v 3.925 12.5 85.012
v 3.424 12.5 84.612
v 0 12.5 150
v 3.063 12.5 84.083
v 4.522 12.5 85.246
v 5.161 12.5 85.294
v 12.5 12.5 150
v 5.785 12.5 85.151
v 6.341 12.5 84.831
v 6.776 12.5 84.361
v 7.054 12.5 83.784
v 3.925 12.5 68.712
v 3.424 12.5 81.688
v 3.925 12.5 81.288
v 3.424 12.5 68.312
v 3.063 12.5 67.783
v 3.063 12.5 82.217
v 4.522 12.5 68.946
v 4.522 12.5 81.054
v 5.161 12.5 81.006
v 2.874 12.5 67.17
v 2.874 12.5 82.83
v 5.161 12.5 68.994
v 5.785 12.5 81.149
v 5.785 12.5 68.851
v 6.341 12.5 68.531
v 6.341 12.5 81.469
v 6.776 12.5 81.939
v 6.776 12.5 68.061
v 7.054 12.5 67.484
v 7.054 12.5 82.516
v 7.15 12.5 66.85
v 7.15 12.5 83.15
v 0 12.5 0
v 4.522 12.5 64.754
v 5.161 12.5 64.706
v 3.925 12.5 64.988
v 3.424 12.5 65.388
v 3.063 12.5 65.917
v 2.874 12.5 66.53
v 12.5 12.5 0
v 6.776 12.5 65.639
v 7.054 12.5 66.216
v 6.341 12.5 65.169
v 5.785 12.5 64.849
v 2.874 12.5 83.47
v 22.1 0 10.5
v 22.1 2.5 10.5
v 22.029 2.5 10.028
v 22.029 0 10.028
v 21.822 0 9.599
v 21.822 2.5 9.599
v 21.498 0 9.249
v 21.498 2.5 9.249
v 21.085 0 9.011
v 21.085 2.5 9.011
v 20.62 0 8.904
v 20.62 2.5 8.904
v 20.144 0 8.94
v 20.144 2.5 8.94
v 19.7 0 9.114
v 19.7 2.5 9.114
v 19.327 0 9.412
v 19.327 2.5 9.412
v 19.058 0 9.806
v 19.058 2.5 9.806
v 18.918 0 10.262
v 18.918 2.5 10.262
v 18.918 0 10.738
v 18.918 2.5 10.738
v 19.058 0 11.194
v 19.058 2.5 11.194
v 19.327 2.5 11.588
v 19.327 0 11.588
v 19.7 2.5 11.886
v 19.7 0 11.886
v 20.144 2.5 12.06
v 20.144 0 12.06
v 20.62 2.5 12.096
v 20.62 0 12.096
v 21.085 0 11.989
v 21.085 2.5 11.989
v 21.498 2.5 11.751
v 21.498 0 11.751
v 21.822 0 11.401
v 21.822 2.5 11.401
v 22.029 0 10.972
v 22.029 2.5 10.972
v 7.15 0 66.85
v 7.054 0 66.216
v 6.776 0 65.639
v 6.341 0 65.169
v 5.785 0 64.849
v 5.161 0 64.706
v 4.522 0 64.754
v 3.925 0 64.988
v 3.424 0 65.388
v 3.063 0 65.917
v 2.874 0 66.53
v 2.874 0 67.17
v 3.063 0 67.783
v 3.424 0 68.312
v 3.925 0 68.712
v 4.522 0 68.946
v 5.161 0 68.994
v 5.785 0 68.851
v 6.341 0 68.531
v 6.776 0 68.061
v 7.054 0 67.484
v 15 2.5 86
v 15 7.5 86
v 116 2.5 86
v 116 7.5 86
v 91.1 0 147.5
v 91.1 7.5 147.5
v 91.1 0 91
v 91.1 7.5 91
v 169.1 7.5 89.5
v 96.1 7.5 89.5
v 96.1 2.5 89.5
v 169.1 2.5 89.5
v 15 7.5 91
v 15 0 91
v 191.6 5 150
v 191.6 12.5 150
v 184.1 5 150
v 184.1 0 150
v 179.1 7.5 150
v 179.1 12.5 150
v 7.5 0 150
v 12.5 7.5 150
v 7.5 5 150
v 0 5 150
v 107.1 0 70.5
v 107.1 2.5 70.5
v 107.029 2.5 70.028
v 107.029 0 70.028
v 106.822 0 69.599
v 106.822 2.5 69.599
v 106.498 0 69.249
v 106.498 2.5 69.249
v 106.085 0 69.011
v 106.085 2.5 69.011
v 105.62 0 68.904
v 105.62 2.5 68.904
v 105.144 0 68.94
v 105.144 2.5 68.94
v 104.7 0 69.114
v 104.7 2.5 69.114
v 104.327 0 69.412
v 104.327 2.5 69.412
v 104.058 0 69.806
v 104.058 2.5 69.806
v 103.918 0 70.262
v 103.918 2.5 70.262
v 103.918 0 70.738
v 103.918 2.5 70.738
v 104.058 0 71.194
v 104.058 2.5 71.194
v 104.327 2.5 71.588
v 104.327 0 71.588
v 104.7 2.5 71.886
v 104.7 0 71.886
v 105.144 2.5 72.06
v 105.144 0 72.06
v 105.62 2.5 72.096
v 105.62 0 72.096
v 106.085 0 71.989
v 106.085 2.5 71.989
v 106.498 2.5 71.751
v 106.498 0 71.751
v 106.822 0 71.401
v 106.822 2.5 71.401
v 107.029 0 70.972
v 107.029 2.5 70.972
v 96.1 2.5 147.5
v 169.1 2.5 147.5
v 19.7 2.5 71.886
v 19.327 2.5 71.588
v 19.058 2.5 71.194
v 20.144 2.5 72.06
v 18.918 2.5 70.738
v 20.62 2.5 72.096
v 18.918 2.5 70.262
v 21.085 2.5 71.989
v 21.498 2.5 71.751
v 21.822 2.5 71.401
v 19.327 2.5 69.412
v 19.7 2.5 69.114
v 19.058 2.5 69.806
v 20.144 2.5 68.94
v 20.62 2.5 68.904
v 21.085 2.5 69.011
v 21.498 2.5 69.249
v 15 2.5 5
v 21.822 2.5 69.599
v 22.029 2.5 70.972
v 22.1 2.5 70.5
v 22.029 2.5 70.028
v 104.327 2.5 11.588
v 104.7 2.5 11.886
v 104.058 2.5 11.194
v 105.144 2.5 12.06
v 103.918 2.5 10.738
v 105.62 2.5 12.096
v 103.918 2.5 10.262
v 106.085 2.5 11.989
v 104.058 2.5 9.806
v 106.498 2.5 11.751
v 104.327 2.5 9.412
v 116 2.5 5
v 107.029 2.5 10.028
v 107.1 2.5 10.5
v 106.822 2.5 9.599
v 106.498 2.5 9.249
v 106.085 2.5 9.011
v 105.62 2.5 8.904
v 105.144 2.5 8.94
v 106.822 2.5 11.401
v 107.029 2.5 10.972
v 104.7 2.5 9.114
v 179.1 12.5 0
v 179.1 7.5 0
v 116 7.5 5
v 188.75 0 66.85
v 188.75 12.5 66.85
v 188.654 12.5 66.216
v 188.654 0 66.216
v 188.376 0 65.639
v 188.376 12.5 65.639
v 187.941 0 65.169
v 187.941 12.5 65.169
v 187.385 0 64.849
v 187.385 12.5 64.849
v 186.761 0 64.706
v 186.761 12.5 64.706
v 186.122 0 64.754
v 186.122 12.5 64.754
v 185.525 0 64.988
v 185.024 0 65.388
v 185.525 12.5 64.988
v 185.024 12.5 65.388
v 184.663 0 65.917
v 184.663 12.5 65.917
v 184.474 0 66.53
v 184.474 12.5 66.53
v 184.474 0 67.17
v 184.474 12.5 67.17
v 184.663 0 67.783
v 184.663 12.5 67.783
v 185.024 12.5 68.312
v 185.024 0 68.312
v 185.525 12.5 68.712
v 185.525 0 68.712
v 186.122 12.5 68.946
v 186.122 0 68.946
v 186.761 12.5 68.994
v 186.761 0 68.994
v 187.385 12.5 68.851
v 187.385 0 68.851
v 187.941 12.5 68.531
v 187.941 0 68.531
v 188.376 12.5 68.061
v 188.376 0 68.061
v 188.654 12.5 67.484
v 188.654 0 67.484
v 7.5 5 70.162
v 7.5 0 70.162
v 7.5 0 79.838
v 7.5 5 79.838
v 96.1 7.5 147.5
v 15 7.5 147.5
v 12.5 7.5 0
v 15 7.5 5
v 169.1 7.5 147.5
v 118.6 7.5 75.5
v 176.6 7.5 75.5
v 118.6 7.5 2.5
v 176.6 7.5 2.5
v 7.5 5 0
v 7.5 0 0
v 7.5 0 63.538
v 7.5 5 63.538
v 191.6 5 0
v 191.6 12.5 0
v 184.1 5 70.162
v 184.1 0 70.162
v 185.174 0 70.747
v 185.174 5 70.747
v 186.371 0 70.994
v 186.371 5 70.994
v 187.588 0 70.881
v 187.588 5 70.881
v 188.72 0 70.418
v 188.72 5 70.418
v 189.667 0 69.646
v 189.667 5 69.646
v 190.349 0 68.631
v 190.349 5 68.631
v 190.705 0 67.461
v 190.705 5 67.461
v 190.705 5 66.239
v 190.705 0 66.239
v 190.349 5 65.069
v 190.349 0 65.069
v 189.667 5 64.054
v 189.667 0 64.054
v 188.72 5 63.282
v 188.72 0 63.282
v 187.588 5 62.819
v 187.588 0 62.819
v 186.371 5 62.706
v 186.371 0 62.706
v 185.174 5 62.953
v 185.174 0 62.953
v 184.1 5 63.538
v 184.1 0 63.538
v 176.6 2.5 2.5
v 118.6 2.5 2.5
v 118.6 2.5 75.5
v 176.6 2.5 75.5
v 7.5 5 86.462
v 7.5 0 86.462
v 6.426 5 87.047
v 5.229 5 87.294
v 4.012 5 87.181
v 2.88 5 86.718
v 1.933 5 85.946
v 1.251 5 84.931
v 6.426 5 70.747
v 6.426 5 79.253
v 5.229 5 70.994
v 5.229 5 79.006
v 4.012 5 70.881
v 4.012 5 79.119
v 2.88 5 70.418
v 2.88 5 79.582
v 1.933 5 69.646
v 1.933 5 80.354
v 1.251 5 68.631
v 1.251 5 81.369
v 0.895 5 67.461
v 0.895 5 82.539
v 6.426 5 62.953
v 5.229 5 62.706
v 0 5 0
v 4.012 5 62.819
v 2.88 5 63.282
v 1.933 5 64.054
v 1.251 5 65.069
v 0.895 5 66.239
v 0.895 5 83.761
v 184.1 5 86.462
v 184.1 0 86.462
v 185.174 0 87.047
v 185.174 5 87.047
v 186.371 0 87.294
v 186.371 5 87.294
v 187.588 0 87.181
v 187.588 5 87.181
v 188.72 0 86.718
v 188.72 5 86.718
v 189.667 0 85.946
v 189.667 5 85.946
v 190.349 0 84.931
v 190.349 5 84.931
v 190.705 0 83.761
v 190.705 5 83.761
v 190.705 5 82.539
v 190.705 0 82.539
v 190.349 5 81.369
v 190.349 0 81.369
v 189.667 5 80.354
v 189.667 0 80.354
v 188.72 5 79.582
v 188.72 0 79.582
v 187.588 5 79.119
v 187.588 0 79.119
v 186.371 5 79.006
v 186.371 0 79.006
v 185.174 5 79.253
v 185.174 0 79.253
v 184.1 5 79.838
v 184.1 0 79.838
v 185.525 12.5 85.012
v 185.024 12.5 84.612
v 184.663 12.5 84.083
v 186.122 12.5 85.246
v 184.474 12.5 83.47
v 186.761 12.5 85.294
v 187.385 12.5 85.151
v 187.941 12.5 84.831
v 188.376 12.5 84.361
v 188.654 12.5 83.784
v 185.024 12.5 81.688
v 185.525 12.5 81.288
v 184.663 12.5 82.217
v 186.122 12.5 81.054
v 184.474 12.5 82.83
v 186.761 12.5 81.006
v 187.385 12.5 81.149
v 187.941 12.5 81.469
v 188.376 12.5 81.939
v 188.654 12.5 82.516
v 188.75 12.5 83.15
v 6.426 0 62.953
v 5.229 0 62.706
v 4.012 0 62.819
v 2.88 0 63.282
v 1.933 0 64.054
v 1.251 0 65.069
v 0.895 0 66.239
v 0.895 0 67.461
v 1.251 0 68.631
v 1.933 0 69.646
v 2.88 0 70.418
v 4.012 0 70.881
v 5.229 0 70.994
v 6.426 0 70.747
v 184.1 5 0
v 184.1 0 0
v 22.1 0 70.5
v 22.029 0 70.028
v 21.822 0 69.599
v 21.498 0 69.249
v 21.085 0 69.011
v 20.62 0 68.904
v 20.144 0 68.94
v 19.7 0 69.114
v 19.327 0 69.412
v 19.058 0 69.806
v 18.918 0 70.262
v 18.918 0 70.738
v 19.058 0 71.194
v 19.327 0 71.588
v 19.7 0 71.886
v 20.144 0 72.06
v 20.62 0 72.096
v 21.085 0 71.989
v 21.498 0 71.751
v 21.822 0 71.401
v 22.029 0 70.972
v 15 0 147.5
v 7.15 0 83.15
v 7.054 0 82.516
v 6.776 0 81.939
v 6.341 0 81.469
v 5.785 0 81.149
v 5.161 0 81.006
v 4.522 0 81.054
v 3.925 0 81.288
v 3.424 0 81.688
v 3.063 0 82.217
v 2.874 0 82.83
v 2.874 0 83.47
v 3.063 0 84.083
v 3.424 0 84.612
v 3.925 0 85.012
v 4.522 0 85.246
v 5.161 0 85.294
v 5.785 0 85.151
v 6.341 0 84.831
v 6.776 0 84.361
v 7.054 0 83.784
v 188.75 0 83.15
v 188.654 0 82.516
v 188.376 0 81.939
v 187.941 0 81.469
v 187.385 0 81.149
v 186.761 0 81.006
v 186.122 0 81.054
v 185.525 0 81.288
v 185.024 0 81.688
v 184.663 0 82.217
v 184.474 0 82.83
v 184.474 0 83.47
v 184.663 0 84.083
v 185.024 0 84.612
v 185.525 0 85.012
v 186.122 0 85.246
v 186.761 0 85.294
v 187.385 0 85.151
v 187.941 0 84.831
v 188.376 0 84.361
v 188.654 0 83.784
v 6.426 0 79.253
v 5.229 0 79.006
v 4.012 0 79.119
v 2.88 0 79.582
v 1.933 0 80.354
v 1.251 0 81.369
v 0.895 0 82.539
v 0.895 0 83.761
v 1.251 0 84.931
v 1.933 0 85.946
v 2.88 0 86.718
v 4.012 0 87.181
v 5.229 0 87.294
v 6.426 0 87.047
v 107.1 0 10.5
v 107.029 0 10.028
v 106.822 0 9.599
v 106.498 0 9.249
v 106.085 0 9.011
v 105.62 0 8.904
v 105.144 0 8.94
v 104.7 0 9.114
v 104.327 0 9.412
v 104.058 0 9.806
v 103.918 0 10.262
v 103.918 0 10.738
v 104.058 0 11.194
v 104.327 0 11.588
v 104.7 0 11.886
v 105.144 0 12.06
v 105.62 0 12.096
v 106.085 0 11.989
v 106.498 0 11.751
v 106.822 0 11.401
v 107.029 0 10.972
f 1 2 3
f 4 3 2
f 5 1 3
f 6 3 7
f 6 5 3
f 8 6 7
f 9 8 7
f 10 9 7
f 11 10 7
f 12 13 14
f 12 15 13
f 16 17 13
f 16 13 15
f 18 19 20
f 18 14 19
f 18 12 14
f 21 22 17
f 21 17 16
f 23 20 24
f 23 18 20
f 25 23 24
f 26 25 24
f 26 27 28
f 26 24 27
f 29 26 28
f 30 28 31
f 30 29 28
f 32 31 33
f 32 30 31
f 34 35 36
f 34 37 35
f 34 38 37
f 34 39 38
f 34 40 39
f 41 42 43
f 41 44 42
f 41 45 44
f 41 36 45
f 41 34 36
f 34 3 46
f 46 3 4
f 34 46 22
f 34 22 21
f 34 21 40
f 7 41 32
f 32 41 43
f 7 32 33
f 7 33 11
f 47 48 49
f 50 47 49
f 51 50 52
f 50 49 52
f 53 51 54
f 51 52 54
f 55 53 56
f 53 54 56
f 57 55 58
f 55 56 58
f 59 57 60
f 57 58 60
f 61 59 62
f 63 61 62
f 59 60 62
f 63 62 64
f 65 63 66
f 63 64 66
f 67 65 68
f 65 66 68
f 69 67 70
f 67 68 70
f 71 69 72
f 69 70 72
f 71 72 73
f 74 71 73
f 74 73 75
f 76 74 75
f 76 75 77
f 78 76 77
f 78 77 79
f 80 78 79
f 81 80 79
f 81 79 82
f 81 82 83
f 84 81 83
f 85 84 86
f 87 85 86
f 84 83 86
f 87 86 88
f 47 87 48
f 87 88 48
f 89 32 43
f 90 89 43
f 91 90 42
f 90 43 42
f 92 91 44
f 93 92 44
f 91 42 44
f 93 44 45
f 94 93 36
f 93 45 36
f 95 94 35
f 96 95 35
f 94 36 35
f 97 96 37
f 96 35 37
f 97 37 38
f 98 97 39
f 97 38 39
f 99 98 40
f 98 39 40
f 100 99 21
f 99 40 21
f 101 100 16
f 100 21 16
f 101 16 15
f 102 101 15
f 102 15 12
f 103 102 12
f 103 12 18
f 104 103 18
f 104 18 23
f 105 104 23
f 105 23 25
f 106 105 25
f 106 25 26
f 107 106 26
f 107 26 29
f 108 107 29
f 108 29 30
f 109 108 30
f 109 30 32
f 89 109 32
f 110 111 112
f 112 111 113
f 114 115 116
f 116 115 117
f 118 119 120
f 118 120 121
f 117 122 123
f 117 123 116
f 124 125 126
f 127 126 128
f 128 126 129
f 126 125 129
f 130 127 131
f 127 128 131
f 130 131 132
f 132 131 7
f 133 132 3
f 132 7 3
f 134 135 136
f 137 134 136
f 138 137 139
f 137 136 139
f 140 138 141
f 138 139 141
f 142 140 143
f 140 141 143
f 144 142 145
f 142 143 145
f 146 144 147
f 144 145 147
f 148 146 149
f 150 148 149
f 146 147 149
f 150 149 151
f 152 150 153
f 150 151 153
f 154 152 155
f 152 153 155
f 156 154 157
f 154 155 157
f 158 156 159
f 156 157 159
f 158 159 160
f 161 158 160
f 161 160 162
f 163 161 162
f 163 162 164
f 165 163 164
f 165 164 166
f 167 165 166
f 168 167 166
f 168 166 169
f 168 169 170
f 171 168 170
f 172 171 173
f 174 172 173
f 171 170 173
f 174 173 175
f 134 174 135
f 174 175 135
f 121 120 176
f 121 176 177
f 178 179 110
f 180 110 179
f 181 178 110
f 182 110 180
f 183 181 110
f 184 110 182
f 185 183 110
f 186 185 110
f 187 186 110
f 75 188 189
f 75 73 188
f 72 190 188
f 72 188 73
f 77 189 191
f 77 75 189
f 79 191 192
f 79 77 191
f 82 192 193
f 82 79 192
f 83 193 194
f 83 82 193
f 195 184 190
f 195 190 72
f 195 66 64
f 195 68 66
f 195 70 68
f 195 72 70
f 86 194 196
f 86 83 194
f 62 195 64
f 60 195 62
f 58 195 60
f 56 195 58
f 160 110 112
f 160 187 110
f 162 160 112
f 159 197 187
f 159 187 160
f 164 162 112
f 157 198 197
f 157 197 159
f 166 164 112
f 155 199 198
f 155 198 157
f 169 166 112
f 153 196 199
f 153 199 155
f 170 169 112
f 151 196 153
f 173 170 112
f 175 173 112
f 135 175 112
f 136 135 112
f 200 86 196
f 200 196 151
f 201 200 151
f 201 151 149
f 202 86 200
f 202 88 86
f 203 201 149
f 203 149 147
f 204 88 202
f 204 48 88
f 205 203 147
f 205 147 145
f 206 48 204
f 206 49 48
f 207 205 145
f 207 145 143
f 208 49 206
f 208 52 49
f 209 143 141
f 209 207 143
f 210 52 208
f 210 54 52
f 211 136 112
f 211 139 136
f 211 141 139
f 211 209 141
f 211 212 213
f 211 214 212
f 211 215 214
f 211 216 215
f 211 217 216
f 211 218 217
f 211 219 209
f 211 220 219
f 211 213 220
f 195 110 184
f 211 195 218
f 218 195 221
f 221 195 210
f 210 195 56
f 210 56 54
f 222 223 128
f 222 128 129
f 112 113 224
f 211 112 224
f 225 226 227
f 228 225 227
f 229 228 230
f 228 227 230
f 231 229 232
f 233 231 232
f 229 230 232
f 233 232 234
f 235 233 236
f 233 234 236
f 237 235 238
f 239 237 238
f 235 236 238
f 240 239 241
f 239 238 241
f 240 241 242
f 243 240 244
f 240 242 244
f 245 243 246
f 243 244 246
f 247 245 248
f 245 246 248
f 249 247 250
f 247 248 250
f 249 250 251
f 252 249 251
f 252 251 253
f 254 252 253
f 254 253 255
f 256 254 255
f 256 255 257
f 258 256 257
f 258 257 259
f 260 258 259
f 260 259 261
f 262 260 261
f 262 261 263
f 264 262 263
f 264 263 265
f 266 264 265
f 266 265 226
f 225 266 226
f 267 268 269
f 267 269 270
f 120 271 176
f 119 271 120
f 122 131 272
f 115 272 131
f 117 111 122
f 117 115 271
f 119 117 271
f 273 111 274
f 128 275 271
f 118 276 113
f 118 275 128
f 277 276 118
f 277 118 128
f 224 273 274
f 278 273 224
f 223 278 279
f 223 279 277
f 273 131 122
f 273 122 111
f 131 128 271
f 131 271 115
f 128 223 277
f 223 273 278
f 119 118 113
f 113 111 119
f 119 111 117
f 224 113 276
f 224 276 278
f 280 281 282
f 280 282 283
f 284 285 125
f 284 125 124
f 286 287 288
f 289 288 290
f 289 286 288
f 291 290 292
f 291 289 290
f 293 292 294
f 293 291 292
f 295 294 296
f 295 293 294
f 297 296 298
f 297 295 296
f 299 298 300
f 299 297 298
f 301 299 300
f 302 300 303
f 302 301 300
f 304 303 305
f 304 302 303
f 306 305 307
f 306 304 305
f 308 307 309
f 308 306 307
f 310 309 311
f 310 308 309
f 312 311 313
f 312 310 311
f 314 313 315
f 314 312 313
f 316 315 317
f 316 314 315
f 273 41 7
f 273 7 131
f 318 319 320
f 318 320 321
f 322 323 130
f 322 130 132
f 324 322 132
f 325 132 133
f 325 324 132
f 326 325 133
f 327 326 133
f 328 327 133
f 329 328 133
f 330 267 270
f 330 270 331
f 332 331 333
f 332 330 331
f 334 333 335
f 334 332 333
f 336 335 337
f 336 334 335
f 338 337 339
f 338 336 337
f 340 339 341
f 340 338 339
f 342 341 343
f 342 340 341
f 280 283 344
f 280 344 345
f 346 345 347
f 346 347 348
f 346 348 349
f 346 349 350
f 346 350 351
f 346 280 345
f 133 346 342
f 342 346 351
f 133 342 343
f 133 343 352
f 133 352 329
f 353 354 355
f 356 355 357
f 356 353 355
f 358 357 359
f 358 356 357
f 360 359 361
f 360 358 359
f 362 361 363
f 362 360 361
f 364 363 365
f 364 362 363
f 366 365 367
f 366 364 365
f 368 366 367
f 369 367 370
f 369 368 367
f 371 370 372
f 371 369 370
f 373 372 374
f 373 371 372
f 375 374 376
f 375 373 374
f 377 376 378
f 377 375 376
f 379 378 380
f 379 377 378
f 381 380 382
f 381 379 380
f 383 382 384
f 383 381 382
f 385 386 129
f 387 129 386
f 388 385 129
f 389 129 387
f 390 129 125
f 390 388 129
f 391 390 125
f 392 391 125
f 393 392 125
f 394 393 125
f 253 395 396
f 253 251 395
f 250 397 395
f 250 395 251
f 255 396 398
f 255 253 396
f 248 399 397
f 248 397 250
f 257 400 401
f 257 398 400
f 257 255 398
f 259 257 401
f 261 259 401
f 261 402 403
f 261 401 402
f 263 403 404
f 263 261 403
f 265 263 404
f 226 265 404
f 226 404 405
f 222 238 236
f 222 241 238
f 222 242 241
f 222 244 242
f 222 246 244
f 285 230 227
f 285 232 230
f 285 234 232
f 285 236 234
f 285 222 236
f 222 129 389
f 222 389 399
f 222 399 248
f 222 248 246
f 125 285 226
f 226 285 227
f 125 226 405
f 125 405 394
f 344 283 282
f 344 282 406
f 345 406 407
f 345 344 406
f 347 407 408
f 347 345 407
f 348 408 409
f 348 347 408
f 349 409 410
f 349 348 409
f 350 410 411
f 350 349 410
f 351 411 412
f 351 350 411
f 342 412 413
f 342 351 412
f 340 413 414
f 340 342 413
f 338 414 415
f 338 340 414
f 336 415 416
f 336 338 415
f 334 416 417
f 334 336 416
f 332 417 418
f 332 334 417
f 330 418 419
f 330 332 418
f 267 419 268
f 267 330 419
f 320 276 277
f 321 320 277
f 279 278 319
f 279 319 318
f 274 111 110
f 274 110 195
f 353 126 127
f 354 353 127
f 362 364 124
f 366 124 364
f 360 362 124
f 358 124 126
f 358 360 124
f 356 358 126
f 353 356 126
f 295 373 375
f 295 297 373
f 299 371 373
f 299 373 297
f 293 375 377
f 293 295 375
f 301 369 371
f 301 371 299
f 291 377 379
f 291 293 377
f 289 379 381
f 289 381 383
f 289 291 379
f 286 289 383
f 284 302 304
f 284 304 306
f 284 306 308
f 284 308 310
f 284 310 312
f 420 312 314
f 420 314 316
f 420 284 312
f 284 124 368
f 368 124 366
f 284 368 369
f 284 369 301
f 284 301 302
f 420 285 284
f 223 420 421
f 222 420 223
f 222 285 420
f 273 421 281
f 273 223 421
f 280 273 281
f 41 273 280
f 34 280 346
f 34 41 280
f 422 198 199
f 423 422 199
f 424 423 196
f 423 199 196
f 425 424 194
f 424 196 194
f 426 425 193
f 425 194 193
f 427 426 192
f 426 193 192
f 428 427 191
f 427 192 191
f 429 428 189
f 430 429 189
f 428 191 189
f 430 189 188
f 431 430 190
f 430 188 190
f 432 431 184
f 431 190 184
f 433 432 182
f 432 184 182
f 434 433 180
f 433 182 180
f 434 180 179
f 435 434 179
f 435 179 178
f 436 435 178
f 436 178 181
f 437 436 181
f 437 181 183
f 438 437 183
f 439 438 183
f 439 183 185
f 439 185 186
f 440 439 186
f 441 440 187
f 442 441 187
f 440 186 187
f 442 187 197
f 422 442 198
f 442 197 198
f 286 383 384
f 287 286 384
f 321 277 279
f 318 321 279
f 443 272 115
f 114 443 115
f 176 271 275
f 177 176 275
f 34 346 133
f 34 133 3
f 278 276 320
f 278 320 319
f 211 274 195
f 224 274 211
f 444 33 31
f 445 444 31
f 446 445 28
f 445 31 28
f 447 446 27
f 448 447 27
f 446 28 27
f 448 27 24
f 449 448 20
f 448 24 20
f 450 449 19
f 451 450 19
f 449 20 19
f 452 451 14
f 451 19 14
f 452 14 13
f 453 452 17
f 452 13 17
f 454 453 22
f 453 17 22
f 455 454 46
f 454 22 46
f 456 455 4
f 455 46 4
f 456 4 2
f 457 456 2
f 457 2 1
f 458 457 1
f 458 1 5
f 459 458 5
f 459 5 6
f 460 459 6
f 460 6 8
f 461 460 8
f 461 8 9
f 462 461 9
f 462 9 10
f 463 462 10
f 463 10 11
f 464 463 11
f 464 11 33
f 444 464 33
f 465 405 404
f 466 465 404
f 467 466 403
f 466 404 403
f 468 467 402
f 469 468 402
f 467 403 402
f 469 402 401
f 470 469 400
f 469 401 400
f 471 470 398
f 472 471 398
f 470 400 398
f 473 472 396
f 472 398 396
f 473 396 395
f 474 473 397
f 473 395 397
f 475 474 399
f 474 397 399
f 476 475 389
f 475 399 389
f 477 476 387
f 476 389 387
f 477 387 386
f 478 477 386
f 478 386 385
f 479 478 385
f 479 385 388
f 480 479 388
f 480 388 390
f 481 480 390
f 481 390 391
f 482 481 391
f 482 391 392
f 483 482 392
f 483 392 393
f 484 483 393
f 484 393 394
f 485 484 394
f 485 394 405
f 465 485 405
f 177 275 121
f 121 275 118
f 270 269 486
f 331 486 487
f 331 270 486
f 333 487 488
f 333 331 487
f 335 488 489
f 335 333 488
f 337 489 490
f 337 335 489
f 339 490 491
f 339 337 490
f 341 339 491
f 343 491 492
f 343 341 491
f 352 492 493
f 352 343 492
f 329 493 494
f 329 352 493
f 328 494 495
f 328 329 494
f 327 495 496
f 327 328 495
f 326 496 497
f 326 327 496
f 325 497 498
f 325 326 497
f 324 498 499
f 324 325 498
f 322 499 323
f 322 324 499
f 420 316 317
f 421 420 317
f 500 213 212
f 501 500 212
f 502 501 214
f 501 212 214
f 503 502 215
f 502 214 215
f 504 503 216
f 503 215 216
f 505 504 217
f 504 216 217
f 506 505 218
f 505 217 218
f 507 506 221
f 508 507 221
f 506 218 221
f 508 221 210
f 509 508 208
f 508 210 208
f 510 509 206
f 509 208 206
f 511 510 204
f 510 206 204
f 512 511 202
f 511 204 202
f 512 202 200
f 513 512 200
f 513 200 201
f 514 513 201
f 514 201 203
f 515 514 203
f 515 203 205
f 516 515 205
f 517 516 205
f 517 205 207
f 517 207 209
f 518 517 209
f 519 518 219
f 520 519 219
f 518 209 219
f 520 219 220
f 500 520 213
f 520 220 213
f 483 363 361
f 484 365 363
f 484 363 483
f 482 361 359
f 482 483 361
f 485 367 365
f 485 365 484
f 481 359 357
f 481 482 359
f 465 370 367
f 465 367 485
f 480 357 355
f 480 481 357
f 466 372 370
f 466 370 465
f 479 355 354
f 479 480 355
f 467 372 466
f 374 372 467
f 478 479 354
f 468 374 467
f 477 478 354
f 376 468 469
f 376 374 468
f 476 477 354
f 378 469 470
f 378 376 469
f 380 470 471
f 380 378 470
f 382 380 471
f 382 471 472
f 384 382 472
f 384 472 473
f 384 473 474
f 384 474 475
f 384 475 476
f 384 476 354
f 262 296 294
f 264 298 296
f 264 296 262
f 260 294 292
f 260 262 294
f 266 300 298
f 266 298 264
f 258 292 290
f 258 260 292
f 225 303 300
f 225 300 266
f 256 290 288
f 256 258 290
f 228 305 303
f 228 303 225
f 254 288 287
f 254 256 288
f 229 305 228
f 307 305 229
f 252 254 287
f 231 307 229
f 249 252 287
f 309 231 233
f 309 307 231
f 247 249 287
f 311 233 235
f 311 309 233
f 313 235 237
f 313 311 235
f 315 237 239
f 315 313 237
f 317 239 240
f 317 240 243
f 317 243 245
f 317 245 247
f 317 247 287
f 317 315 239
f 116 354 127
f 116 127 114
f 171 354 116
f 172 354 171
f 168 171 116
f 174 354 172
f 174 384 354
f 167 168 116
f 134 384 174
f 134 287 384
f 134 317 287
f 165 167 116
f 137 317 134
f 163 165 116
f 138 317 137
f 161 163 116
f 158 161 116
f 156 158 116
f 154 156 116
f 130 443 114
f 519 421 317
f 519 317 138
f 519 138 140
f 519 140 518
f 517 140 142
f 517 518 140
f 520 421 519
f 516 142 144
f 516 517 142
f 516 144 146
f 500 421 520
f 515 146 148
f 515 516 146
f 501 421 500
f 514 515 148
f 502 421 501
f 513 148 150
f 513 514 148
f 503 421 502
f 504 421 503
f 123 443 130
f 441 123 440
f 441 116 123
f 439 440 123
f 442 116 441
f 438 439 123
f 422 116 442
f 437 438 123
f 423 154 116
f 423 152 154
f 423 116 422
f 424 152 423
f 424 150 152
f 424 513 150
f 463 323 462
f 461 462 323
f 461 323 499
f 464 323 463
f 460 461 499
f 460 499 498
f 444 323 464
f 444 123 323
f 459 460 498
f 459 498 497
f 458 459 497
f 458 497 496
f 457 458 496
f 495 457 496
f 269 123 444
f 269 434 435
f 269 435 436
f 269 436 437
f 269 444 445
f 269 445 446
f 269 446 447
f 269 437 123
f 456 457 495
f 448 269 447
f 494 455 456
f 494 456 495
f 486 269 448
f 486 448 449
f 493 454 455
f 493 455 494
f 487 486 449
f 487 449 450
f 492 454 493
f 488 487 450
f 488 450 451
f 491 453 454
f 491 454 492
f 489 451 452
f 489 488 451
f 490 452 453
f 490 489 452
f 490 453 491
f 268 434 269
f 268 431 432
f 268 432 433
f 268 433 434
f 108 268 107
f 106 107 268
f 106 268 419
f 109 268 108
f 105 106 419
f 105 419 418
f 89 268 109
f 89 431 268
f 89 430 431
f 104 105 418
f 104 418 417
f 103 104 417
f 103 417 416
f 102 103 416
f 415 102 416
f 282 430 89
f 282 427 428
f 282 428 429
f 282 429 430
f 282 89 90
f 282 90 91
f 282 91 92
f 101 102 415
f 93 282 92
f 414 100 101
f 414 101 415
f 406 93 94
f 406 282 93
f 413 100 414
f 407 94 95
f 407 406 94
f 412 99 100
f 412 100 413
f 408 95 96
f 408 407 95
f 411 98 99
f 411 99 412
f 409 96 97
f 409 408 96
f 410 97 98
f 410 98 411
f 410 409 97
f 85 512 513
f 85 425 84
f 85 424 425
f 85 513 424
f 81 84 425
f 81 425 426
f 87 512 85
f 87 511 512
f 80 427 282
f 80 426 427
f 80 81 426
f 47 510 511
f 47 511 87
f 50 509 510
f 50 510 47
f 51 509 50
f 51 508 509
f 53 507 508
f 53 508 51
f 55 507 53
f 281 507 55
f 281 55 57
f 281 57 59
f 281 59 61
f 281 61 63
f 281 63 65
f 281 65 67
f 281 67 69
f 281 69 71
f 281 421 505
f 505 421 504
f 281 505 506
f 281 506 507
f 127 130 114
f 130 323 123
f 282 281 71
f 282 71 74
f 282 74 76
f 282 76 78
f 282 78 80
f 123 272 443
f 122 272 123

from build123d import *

# Parameters (mm, degrees)
PLATEFRAME_DEPTH          = 150
SKETCH3_R                 = 2.15
HOLESUPPORT_DEPTH         = 7.5
SKETCH4_R                 = 4.15
SKETCH4_R_2               = 2.15
CYLINDRICALSUPPORTS_DEPTH = 12.5
SKETCH5_W                 = 101
SKETCH5_H                 = 81
SKETCH5_W_2               = 58
SKETCH5_H_2               = 73
SKETCH5_W_3               = 73
SKETCH5_H_3               = 58
ITEMLAYOUT_DEPTH          = 5
SKETCH6_R                 = 1.6
JETSONBASEHOLES_DEPTH     = 2.5
SKETCH7_W                 = 76.1
SKETCH7_H                 = 56.5
OPENHOLE_DEPTH            = 8.5


with BuildPart() as part:
    # Sketch2 → PlateFrame (new body)
    with BuildSketch(Plane.XY):
        Polygon((179.1, 12.5), (191.6, 12.5), (191.6, 5), (184.1, 5), (184.1, 0), (7.5, 0), (7.5, 5), (0, 5), (0, 12.5), (12.5, 12.5), (12.5, 7.5), (179.1, 7.5), align=None)
    extrude(amount=PLATEFRAME_DEPTH)

    # Sketch3 → HoleSupport (cut)
    with BuildSketch(Plane(origin=(0, 12.5, 0), x_dir=(1, 0, 0), z_dir=(0, 1, 0))):
        with Locations((5, -66.85)):
            Circle(SKETCH3_R)
        with Locations((5, -83.15)):
            Circle(SKETCH3_R)
        with Locations((186.6, -66.85)):
            Circle(SKETCH3_R)
        with Locations((186.6, -83.15)):
            Circle(SKETCH3_R)
    extrude(amount=-HOLESUPPORT_DEPTH, mode=Mode.SUBTRACT)

    # Sketch4 → CylindricalSupports (add)
    with BuildSketch(Plane(origin=(0, 12.5, 0), x_dir=(1, 0, 0), z_dir=(0, 1, 0))):
        with Locations((186.6, -66.85)):
            Circle(SKETCH4_R)
        with Locations((186.6, -66.85)):
            Circle(SKETCH4_R_2, mode=Mode.SUBTRACT)
        with Locations((186.6, -83.15)):
            Circle(SKETCH4_R)
        with Locations((186.6, -83.15)):
            Circle(SKETCH4_R_2, mode=Mode.SUBTRACT)
        with Locations((5, -66.85)):
            Circle(SKETCH4_R)
        with Locations((5, -66.85)):
            Circle(SKETCH4_R_2, mode=Mode.SUBTRACT)
        with Locations((5, -83.15)):
            Circle(SKETCH4_R)
        with Locations((5, -83.15)):
            Circle(SKETCH4_R_2, mode=Mode.SUBTRACT)
    extrude(amount=-CYLINDRICALSUPPORTS_DEPTH)

    # Sketch5 → ItemLayout (cut)
    with BuildSketch(Plane(origin=(0, 7.5, 0), x_dir=(1, 0, 0), z_dir=(0, 1, 0))):
        with Locations((65.5, -45.5)):
            Rectangle(SKETCH5_W, SKETCH5_H)
        with Locations((147.6, -39)):
            Rectangle(SKETCH5_W_2, SKETCH5_H_2)
        with Locations((132.6, -118.5)):
            Rectangle(SKETCH5_W_3, SKETCH5_H_3)
    extrude(amount=-ITEMLAYOUT_DEPTH, mode=Mode.SUBTRACT)

    # Sketch6 → JetsonBaseHoles (cut)
    with BuildSketch(Plane(origin=(0, 2.5, 0), x_dir=(1, 0, 0), z_dir=(0, 1, 0))):
        with Locations((20.5, -10.5)):
            Circle(SKETCH6_R)
        with Locations((20.5, -70.5)):
            Circle(SKETCH6_R)
        with Locations((105.5, -70.5)):
            Circle(SKETCH6_R)
        with Locations((105.5, -10.5)):
            Circle(SKETCH6_R)
    extrude(amount=-JETSONBASEHOLES_DEPTH, mode=Mode.SUBTRACT)

    # Sketch7 → OpenHole (cut, through all)
    with BuildSketch(Plane(origin=(0, 7.5, 0), x_dir=(1, 0, 0), z_dir=(0, 1, 0))):
        with Locations((53.05, -119.25)):
            Rectangle(SKETCH7_W, SKETCH7_H)
    extrude(amount=-OPENHOLE_DEPTH, mode=Mode.SUBTRACT)


solid = part.part
